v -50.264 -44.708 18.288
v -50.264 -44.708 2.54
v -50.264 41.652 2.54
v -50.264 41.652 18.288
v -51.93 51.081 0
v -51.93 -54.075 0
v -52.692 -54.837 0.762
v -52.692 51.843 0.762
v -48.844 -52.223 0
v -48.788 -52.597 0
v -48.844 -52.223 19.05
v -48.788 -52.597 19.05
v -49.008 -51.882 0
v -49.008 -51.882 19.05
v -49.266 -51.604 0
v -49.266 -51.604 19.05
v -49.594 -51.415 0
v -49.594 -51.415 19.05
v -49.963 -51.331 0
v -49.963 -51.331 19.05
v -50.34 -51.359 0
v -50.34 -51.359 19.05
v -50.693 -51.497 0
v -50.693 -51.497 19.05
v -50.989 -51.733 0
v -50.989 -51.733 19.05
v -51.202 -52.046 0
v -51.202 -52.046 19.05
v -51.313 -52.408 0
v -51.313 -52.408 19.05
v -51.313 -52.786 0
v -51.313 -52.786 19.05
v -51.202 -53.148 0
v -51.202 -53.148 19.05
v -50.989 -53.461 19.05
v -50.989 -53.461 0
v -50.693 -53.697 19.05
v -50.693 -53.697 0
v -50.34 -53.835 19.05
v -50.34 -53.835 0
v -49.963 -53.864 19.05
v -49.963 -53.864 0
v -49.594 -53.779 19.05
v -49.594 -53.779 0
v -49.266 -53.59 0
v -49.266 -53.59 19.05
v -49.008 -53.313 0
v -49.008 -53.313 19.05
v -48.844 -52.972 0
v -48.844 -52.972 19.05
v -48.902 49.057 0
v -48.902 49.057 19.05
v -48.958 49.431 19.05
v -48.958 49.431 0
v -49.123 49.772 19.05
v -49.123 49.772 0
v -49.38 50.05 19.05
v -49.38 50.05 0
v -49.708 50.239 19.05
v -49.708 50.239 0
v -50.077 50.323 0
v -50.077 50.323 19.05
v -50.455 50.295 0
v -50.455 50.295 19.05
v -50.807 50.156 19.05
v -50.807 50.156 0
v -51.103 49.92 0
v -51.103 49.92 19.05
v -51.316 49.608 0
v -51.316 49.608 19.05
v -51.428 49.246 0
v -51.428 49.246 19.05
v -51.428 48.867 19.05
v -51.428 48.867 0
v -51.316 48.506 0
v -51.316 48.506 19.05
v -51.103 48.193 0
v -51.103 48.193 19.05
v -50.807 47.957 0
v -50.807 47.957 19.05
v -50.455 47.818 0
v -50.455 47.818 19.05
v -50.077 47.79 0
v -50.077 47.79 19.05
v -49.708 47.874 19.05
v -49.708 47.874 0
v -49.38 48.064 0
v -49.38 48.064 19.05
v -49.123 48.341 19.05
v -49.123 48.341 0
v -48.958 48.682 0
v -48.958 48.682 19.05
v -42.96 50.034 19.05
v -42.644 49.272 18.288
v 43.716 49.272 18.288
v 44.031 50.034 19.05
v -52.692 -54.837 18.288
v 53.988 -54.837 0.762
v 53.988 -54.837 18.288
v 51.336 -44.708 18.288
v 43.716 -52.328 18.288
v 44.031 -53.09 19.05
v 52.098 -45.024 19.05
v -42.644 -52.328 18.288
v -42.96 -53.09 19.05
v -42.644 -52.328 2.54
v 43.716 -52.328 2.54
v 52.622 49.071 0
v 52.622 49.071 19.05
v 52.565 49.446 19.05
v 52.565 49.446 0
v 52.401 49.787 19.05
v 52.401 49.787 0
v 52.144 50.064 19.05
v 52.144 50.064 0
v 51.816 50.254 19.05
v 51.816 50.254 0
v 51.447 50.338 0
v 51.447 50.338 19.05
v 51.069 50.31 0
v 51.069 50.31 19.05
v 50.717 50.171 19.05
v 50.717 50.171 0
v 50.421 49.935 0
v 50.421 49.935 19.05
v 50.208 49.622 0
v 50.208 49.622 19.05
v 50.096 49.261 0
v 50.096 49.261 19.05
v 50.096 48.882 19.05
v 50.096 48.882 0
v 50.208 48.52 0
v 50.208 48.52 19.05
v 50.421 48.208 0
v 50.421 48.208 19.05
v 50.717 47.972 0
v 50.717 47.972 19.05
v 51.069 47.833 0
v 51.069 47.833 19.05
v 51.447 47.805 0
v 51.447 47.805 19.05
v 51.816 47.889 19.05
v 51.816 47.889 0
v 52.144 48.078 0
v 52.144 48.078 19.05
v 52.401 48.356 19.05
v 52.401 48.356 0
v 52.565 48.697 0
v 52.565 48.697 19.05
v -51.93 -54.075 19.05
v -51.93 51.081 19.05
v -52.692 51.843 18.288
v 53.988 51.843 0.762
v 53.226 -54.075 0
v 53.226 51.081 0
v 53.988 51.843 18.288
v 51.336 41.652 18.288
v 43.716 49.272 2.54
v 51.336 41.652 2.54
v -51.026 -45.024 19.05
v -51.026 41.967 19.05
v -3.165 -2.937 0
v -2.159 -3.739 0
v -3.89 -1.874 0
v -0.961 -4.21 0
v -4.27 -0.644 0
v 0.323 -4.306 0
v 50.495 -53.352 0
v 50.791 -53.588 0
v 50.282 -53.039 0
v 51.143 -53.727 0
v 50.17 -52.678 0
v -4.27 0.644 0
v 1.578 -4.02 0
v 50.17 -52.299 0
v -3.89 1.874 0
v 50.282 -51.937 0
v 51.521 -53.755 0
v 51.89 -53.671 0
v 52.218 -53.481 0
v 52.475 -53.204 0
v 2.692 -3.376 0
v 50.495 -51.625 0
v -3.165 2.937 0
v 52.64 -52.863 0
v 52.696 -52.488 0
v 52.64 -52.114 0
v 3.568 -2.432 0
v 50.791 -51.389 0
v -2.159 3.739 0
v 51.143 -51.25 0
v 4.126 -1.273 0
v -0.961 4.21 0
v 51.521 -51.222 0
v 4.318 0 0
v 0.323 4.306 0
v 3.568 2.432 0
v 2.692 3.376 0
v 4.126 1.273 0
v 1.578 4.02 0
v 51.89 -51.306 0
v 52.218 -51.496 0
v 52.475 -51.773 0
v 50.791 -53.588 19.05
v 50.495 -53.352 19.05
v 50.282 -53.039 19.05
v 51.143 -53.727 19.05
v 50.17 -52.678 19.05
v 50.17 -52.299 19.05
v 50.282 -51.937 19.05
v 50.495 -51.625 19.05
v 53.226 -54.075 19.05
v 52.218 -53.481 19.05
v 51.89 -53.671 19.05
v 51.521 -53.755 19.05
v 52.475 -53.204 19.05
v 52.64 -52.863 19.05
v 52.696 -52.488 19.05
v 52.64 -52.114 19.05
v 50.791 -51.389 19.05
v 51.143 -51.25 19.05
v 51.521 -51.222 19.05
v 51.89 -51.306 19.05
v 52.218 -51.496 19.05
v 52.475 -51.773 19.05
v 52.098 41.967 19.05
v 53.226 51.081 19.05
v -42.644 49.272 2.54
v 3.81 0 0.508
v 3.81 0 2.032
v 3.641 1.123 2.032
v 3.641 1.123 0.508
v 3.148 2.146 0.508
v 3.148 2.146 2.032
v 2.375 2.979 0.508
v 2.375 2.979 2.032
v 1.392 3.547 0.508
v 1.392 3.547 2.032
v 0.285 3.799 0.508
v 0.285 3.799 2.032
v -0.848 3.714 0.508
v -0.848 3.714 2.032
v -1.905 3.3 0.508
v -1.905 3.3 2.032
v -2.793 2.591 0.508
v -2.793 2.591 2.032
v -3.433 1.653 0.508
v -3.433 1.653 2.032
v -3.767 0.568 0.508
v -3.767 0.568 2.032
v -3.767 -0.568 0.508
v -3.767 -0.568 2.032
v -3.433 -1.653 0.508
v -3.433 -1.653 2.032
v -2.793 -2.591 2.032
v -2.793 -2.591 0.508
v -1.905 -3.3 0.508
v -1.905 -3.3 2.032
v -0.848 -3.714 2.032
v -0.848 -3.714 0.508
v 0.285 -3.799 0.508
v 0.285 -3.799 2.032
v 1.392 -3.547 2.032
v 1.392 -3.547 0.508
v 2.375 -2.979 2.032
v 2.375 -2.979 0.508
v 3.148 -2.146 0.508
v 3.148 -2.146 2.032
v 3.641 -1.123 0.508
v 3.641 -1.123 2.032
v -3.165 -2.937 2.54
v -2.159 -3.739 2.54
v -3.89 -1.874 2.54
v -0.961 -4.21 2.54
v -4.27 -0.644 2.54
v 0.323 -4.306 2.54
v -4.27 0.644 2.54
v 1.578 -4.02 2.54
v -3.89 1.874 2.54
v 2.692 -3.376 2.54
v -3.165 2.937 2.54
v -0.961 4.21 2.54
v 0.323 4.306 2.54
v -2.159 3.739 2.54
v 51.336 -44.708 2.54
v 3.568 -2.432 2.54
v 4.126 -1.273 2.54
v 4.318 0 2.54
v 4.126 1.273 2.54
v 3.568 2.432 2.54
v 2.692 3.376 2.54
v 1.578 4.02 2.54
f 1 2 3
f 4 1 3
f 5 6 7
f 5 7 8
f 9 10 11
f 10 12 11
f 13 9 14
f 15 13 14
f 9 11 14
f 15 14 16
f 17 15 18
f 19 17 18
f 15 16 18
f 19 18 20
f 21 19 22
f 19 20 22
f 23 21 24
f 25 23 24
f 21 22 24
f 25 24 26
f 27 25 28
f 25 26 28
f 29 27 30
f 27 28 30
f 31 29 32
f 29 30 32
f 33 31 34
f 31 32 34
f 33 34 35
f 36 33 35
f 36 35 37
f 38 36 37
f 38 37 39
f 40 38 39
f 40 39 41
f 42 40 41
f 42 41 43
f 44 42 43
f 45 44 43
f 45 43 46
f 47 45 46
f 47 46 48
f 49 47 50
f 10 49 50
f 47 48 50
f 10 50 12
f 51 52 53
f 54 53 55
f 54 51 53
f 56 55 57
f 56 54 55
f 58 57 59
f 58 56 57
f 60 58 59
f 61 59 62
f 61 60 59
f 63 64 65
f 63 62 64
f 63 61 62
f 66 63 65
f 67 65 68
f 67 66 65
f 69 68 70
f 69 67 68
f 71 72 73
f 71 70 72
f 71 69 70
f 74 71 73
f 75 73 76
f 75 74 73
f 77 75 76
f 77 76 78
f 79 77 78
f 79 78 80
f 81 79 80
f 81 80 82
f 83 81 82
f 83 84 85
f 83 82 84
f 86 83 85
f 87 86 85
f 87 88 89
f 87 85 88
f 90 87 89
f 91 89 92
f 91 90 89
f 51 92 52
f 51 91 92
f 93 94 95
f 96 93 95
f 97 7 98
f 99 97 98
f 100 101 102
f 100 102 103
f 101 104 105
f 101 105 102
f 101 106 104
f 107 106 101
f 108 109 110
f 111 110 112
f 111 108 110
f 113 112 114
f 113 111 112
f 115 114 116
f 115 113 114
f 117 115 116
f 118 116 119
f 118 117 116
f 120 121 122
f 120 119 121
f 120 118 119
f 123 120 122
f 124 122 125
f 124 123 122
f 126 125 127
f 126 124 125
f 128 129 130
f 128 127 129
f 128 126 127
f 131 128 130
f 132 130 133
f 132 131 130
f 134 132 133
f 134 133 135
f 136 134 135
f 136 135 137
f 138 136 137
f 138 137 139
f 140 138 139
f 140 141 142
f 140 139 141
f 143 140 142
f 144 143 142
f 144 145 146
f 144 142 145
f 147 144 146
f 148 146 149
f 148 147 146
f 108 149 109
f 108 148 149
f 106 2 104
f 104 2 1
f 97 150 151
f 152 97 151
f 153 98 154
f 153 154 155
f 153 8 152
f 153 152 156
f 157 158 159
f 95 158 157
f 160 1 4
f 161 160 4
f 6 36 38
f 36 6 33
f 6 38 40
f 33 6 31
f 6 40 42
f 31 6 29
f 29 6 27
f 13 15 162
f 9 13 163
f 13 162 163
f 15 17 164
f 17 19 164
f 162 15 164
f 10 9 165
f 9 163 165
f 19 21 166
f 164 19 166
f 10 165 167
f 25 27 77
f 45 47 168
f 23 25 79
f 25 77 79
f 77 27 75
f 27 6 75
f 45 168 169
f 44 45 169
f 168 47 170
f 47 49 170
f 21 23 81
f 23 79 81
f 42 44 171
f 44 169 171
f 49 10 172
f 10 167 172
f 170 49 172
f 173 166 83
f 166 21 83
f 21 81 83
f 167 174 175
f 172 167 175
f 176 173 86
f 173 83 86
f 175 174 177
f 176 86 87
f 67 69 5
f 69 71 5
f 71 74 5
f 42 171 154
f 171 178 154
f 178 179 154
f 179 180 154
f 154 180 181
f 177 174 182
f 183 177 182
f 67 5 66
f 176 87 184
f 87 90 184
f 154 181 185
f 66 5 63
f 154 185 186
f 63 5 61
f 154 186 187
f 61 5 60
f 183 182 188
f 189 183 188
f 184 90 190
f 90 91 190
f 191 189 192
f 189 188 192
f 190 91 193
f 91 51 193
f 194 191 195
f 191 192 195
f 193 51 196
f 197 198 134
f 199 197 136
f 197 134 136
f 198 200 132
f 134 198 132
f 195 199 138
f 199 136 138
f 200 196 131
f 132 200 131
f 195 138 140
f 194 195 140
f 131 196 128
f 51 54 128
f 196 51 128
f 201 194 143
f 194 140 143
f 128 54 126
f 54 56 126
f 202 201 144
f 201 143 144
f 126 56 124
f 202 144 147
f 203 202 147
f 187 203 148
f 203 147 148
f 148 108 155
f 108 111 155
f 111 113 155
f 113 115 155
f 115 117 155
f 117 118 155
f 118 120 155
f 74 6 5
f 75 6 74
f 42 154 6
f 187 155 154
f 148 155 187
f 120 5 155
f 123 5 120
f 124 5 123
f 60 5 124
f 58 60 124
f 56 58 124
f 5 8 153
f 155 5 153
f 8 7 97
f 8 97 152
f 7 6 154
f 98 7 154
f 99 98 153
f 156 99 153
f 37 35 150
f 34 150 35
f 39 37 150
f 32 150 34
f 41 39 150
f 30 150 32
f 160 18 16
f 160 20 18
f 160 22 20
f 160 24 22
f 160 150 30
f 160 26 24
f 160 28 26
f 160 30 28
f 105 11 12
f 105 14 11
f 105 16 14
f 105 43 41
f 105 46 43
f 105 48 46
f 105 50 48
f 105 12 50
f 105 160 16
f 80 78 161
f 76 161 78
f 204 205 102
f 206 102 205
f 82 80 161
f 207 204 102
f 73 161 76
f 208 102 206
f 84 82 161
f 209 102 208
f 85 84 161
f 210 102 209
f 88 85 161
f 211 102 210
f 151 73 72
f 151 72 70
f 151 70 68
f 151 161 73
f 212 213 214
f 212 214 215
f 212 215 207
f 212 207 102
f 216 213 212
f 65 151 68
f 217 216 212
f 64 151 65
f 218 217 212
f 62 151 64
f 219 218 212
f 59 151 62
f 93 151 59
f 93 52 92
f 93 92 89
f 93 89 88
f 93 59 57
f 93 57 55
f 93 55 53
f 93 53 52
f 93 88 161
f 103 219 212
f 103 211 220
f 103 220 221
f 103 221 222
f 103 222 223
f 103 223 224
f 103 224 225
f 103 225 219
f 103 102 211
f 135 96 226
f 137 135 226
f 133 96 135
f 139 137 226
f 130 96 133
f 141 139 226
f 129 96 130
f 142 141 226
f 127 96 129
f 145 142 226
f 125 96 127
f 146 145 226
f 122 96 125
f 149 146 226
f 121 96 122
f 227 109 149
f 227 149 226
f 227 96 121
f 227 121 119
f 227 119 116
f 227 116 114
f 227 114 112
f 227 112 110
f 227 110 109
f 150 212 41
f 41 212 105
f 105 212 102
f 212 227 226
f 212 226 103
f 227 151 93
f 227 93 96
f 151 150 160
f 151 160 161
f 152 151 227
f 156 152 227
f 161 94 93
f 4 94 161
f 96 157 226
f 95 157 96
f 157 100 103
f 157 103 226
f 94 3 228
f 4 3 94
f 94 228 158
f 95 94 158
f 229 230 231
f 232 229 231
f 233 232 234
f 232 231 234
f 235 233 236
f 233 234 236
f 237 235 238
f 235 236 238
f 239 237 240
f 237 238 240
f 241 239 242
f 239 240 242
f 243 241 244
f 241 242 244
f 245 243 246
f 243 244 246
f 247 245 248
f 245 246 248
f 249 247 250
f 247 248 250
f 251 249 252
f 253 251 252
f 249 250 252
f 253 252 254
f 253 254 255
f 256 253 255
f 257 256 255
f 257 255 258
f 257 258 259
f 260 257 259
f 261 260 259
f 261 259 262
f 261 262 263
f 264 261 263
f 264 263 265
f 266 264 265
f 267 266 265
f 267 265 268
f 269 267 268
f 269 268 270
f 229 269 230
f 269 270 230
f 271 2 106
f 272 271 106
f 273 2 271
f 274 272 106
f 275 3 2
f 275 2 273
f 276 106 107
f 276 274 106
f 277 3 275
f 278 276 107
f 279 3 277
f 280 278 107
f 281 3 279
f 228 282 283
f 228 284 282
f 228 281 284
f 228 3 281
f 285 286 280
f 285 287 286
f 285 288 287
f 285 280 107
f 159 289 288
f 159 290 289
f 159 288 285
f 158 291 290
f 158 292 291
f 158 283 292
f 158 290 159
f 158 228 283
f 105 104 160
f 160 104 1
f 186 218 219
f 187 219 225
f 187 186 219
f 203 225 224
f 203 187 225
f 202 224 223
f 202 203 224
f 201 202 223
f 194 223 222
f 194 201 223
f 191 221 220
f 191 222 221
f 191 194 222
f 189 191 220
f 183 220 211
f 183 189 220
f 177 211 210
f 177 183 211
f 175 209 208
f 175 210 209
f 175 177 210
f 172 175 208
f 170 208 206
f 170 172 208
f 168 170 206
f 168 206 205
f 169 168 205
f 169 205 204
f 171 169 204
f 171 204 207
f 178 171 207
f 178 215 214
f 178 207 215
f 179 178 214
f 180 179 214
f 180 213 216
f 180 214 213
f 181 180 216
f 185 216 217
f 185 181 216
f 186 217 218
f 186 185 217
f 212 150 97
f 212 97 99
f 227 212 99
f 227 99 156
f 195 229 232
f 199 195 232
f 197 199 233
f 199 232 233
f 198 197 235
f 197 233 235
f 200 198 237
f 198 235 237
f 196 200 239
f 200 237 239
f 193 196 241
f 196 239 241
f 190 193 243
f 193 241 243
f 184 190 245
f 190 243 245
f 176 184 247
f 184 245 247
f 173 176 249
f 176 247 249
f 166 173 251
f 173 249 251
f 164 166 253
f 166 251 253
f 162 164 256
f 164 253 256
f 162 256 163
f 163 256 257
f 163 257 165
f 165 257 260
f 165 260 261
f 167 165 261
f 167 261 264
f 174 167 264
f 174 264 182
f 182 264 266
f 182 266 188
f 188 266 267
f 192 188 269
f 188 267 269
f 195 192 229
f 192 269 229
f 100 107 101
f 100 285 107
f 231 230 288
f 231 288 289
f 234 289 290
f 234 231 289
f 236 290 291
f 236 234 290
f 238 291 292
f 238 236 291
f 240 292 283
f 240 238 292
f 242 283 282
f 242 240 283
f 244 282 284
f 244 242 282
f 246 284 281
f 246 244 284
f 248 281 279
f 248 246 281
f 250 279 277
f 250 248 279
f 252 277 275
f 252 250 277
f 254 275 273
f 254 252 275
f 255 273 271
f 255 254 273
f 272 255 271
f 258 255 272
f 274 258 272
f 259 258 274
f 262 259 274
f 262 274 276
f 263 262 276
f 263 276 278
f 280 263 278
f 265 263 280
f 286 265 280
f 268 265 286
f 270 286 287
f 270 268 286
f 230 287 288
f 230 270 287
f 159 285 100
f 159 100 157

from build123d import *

# Parameters (mm, degrees)
F0_W     = 106.68
F0_H     = 106.68
F0_W_2   = 101.6
F0_H_2   = 101.6
F1_DEPTH = 19.05
F2_W     = 104.656483978
F2_H     = 104.4136583805
F3_DEPTH = 2.54
F4_R     = 3.81
F5_DEPTH = 12.7
F6_SIZE  = 7.62
F7_R     = 1.27
F8_DEPTH = 38.1
F9_SIZE  = 0.508
F10_SIZE = 0.762
F11_SIZE = 0.762


with BuildPart() as f1:
    # F0 (on Top) → F1 (new body)
    with BuildSketch(Plane.XY):
        with Locations((0.6475270653, -1.4974073434)):
            Rectangle(F0_W, F0_H)
        with Locations((0.5357495129, -1.5282401264)):
            Rectangle(F0_W_2, F0_H_2, mode=Mode.SUBTRACT)
    extrude(amount=F1_DEPTH)

    # F2 (on Top) → F3 (join)
    with BuildSketch(Plane.XY):
        with Locations((0.6070565432, -1.821167767)):
            Rectangle(F2_W, F2_H)
    extrude(amount=F3_DEPTH)

    # F4 (on Top) → F5 (cut, symmetric)
    with BuildSketch(Plane.XY):
        Circle(F4_R)
    extrude(amount=F5_DEPTH, both=True, mode=Mode.SUBTRACT)

    # F6
    f6_edges = [f1.edges().sort_by_distance(p)[0] for p in [
        (-50.26425, 49.27176, 10.795),
        (51.33575, 49.27176, 10.795),
        (51.33575, -52.32824, 10.795),
        (-50.26425, -52.32824, 10.795),
    ]]
    chamfer(f6_edges, length=F6_SIZE)

    # F7 (on Top) → F8 (cut, symmetric)
    with BuildSketch(Plane.XY):
        with Locations((-50.1719862223, 49.0566454828)):
            Circle(F7_R)
        with Locations((51.3518936932, 49.0713790059)):
            Circle(F7_R)
        with Locations((51.4260791242, -52.4884499609)):
            Circle(F7_R)
        with Locations((-50.0576607883, -52.597168833)):
            Circle(F7_R)
    extrude(amount=F8_DEPTH, both=True, mode=Mode.SUBTRACT)

    # F9
    f9_edges = [f1.edges().sort_by_distance(p)[0] for p in [
        (-3.81, 0, 2.54),
        (-3.81, 0, 0),
    ]]
    chamfer(f9_edges, length=F9_SIZE)

    # F10
    f10_edges = [f1.edges().sort_by_distance(p)[0] for p in [
        (0.647527, -54.837407, 19.05),
        (-52.692473, -1.497407, 19.05),
        (53.987527, -1.497407, 19.05),
        (0.647527, 51.842593, 19.05),
        (51.33575, -1.52824, 19.05),
        (47.52575, -48.51824, 19.05),
        (0.53575, -52.32824, 19.05),
        (47.52575, 45.46176, 19.05),
        (0.53575, 49.27176, 19.05),
        (-46.45425, 45.46176, 19.05),
        (-50.26425, -1.52824, 19.05),
        (-46.45425, -48.51824, 19.05),
    ]]
    chamfer(f10_edges, length=F10_SIZE)

    # F11
    f11_edges = [f1.edges().sort_by_distance(p)[0] for p in [
        (-52.692473, -1.497407, 0),
        (0.647527, 51.842593, 0),
        (0.647527, -54.837407, 0),
        (53.987527, -1.497407, 0),
    ]]
    chamfer(f11_edges, length=F11_SIZE)


solid = f1.part
